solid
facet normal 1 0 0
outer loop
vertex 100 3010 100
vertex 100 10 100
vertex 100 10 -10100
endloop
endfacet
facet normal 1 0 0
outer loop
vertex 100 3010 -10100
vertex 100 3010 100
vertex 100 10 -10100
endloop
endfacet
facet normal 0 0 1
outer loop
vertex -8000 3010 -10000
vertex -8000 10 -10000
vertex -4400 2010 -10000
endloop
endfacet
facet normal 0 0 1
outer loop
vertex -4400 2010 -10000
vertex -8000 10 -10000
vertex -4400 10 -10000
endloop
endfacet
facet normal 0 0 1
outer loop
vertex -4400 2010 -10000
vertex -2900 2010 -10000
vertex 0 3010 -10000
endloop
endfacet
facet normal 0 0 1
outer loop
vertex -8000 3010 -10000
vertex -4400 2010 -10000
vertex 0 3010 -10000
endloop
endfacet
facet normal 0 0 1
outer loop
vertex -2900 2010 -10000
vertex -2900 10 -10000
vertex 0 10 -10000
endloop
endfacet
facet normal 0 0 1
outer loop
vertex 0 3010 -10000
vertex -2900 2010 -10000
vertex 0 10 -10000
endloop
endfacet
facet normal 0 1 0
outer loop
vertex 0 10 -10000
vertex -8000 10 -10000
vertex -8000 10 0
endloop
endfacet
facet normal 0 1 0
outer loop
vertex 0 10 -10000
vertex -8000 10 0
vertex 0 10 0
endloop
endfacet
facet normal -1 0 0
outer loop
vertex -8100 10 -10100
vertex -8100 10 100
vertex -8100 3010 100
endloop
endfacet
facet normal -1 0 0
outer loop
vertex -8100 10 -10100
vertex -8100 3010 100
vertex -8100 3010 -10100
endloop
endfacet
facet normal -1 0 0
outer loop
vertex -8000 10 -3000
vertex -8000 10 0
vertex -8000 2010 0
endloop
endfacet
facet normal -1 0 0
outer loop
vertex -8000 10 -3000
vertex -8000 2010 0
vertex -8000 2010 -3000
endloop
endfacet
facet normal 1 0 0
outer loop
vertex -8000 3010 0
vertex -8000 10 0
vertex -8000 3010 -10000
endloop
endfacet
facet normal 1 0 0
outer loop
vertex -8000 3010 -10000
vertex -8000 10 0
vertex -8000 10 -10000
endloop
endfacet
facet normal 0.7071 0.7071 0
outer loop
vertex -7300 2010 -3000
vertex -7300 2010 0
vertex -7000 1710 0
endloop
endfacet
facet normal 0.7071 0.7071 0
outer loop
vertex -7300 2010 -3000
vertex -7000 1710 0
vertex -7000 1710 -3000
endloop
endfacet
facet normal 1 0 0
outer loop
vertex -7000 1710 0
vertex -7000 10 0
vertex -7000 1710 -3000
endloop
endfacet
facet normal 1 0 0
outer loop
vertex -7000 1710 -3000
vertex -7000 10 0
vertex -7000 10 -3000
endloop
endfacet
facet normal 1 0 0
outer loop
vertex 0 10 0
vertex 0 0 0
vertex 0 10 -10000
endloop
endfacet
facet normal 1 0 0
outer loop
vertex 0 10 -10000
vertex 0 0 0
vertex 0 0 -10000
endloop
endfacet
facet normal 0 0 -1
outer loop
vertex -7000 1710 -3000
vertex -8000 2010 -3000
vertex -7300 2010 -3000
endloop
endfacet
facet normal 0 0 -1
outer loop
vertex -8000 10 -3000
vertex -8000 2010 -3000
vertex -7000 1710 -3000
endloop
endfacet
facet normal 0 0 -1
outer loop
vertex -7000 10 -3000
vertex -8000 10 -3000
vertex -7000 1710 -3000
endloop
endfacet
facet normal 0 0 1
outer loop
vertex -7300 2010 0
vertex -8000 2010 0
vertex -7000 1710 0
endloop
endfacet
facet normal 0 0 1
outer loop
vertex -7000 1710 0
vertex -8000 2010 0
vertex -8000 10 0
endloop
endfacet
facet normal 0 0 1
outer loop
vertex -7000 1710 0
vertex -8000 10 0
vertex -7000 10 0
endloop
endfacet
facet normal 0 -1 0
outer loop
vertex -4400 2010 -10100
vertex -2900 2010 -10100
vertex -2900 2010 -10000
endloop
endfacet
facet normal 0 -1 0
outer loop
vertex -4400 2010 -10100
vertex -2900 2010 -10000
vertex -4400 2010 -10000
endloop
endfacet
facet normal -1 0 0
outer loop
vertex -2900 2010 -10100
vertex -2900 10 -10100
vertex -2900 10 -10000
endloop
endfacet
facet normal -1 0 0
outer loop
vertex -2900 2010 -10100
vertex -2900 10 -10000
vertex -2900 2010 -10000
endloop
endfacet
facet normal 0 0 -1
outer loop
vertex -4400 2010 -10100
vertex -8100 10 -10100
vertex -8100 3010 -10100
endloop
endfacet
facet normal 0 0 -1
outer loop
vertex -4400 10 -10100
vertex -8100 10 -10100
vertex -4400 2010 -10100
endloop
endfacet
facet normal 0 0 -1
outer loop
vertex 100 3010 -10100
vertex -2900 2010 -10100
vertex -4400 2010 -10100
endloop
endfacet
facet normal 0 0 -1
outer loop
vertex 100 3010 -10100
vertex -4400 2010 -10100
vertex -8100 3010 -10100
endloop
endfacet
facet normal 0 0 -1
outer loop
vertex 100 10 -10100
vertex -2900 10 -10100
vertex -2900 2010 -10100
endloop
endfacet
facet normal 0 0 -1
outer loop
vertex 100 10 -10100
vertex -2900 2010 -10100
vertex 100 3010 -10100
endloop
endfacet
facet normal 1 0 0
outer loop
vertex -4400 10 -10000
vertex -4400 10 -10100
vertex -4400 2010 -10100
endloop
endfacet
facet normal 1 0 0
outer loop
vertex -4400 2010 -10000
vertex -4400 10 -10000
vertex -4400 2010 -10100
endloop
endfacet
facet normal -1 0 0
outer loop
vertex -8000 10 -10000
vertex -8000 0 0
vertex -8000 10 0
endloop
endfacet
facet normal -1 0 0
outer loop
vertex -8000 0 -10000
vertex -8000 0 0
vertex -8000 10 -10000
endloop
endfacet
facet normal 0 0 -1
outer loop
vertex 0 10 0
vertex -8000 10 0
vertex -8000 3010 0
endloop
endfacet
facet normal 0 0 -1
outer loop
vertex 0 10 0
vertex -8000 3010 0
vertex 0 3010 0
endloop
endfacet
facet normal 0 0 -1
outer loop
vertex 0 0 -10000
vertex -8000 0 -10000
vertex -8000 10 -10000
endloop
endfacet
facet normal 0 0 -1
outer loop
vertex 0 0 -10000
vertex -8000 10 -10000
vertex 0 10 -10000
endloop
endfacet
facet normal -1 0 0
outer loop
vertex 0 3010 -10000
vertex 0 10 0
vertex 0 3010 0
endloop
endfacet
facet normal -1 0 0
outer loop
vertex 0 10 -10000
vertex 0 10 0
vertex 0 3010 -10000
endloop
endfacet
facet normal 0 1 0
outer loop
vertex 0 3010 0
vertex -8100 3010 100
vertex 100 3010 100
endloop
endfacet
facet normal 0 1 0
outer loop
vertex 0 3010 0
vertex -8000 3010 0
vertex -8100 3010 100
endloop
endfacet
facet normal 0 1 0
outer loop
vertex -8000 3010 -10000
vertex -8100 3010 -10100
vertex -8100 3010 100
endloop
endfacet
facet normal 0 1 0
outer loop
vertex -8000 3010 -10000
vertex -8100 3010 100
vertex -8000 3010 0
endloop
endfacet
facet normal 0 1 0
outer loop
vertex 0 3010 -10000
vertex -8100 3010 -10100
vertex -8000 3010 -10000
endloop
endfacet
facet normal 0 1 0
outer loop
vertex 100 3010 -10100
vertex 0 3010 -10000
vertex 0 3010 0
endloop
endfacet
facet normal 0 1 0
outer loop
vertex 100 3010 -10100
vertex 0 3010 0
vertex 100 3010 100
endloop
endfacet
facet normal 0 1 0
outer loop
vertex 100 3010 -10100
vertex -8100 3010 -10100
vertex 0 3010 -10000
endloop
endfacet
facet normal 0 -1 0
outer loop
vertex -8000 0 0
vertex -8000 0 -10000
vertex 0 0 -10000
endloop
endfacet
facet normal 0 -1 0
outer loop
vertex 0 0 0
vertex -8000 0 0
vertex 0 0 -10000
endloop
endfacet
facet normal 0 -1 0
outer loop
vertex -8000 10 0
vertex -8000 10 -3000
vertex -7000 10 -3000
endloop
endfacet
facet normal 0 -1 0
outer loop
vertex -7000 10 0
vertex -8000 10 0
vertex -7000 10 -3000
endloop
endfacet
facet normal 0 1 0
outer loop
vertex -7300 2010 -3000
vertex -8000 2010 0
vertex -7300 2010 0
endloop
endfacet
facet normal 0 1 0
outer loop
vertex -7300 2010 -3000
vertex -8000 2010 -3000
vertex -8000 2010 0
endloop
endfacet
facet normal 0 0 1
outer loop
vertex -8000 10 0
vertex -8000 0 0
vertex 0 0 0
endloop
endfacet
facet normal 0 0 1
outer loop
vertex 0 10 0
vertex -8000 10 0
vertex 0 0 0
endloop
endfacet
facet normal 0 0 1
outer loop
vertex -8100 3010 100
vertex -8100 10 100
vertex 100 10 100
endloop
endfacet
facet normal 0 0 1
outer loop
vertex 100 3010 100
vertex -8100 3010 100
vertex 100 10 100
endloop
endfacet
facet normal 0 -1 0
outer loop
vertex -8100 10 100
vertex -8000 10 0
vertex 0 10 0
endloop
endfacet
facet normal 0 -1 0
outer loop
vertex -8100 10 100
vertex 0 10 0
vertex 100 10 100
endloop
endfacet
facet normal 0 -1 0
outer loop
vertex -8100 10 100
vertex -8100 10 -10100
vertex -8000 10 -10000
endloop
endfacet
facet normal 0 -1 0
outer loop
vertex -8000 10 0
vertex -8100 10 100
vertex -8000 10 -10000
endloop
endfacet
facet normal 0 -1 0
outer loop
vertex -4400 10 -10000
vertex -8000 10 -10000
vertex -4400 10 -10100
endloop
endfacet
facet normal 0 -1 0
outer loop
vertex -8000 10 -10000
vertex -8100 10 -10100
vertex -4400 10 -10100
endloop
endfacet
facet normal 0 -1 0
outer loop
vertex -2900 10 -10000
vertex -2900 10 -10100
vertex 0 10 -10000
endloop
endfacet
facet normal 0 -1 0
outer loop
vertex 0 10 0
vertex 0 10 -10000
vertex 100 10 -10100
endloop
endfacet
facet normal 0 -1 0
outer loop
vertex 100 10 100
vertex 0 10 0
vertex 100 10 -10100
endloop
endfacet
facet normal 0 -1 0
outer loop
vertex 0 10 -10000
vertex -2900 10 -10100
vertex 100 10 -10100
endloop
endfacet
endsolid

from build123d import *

# Parameters (mm, degrees)
SKETCH1_W           = 8000
SKETCH1_H           = 10000
BOSS_EXTRUDE1_DEPTH = 10
SKETCH3_W           = 8200
SKETCH3_H           = 10200
SKETCH3_W_2         = 8000
SKETCH3_H_2         = 10000
BOSS_EXTRUDE2_DEPTH = 3000
SKETCH4_W           = 1500
SKETCH4_H           = 2000
CUT_EXTRUDE1_DEPTH  = 100
SKETCH5_W           = 1000
SKETCH5_H           = 3000
BOSS_EXTRUDE4_DEPTH = 2000
CHAMFER1_SIZE       = 300


with BuildPart() as part:
    # Sketch1 → Boss-Extrude1 (new body)
    with BuildSketch(Plane(origin=(0, 0, 0), x_dir=(1, 0, 0), z_dir=(0, 1, 0))):
        with Locations((-4000, 5000)):
            Rectangle(SKETCH1_W, SKETCH1_H)
    extrude(amount=BOSS_EXTRUDE1_DEPTH)


with BuildPart() as body_2:
    # Sketch3 → Boss-Extrude2 (new body)
    with BuildSketch(Plane(origin=(0, 10, 0), x_dir=(1, 0, 0), z_dir=(0, 1, 0))):
        with Locations((-4000, 5000)):
            Rectangle(SKETCH3_W, SKETCH3_H)
        with Locations((-4000, 5000)):
            Rectangle(SKETCH3_W_2, SKETCH3_H_2, mode=Mode.SUBTRACT)
    extrude(amount=BOSS_EXTRUDE2_DEPTH)

    # Sketch4 → Cut-Extrude1 (cut)
    with BuildSketch(Plane(origin=(0, 0, -10100), x_dir=(-1, 0, 0), z_dir=(0, 0, -1))):
        with Locations((3650, 1010)):
            Rectangle(SKETCH4_W, SKETCH4_H)
    extrude(amount=-CUT_EXTRUDE1_DEPTH, mode=Mode.SUBTRACT)


with BuildPart() as body_3:
    # Sketch5 → Boss-Extrude4 (new body)
    with BuildSketch(Plane(origin=(0, 10, 0), x_dir=(1, 0, 0), z_dir=(0, 1, 0))):
        with Locations((-7500, 1500)):
            Rectangle(SKETCH5_W, SKETCH5_H)
    extrude(amount=BOSS_EXTRUDE4_DEPTH)

    # Chamfer1
    chamfer1_edges = [body_3.edges().sort_by_distance(p)[0] for p in [
        (-7000, 2010, -1500),
    ]]
    chamfer(chamfer1_edges, length=CHAMFER1_SIZE)


solid = Compound([part.part, body_2.part, body_3.part])
